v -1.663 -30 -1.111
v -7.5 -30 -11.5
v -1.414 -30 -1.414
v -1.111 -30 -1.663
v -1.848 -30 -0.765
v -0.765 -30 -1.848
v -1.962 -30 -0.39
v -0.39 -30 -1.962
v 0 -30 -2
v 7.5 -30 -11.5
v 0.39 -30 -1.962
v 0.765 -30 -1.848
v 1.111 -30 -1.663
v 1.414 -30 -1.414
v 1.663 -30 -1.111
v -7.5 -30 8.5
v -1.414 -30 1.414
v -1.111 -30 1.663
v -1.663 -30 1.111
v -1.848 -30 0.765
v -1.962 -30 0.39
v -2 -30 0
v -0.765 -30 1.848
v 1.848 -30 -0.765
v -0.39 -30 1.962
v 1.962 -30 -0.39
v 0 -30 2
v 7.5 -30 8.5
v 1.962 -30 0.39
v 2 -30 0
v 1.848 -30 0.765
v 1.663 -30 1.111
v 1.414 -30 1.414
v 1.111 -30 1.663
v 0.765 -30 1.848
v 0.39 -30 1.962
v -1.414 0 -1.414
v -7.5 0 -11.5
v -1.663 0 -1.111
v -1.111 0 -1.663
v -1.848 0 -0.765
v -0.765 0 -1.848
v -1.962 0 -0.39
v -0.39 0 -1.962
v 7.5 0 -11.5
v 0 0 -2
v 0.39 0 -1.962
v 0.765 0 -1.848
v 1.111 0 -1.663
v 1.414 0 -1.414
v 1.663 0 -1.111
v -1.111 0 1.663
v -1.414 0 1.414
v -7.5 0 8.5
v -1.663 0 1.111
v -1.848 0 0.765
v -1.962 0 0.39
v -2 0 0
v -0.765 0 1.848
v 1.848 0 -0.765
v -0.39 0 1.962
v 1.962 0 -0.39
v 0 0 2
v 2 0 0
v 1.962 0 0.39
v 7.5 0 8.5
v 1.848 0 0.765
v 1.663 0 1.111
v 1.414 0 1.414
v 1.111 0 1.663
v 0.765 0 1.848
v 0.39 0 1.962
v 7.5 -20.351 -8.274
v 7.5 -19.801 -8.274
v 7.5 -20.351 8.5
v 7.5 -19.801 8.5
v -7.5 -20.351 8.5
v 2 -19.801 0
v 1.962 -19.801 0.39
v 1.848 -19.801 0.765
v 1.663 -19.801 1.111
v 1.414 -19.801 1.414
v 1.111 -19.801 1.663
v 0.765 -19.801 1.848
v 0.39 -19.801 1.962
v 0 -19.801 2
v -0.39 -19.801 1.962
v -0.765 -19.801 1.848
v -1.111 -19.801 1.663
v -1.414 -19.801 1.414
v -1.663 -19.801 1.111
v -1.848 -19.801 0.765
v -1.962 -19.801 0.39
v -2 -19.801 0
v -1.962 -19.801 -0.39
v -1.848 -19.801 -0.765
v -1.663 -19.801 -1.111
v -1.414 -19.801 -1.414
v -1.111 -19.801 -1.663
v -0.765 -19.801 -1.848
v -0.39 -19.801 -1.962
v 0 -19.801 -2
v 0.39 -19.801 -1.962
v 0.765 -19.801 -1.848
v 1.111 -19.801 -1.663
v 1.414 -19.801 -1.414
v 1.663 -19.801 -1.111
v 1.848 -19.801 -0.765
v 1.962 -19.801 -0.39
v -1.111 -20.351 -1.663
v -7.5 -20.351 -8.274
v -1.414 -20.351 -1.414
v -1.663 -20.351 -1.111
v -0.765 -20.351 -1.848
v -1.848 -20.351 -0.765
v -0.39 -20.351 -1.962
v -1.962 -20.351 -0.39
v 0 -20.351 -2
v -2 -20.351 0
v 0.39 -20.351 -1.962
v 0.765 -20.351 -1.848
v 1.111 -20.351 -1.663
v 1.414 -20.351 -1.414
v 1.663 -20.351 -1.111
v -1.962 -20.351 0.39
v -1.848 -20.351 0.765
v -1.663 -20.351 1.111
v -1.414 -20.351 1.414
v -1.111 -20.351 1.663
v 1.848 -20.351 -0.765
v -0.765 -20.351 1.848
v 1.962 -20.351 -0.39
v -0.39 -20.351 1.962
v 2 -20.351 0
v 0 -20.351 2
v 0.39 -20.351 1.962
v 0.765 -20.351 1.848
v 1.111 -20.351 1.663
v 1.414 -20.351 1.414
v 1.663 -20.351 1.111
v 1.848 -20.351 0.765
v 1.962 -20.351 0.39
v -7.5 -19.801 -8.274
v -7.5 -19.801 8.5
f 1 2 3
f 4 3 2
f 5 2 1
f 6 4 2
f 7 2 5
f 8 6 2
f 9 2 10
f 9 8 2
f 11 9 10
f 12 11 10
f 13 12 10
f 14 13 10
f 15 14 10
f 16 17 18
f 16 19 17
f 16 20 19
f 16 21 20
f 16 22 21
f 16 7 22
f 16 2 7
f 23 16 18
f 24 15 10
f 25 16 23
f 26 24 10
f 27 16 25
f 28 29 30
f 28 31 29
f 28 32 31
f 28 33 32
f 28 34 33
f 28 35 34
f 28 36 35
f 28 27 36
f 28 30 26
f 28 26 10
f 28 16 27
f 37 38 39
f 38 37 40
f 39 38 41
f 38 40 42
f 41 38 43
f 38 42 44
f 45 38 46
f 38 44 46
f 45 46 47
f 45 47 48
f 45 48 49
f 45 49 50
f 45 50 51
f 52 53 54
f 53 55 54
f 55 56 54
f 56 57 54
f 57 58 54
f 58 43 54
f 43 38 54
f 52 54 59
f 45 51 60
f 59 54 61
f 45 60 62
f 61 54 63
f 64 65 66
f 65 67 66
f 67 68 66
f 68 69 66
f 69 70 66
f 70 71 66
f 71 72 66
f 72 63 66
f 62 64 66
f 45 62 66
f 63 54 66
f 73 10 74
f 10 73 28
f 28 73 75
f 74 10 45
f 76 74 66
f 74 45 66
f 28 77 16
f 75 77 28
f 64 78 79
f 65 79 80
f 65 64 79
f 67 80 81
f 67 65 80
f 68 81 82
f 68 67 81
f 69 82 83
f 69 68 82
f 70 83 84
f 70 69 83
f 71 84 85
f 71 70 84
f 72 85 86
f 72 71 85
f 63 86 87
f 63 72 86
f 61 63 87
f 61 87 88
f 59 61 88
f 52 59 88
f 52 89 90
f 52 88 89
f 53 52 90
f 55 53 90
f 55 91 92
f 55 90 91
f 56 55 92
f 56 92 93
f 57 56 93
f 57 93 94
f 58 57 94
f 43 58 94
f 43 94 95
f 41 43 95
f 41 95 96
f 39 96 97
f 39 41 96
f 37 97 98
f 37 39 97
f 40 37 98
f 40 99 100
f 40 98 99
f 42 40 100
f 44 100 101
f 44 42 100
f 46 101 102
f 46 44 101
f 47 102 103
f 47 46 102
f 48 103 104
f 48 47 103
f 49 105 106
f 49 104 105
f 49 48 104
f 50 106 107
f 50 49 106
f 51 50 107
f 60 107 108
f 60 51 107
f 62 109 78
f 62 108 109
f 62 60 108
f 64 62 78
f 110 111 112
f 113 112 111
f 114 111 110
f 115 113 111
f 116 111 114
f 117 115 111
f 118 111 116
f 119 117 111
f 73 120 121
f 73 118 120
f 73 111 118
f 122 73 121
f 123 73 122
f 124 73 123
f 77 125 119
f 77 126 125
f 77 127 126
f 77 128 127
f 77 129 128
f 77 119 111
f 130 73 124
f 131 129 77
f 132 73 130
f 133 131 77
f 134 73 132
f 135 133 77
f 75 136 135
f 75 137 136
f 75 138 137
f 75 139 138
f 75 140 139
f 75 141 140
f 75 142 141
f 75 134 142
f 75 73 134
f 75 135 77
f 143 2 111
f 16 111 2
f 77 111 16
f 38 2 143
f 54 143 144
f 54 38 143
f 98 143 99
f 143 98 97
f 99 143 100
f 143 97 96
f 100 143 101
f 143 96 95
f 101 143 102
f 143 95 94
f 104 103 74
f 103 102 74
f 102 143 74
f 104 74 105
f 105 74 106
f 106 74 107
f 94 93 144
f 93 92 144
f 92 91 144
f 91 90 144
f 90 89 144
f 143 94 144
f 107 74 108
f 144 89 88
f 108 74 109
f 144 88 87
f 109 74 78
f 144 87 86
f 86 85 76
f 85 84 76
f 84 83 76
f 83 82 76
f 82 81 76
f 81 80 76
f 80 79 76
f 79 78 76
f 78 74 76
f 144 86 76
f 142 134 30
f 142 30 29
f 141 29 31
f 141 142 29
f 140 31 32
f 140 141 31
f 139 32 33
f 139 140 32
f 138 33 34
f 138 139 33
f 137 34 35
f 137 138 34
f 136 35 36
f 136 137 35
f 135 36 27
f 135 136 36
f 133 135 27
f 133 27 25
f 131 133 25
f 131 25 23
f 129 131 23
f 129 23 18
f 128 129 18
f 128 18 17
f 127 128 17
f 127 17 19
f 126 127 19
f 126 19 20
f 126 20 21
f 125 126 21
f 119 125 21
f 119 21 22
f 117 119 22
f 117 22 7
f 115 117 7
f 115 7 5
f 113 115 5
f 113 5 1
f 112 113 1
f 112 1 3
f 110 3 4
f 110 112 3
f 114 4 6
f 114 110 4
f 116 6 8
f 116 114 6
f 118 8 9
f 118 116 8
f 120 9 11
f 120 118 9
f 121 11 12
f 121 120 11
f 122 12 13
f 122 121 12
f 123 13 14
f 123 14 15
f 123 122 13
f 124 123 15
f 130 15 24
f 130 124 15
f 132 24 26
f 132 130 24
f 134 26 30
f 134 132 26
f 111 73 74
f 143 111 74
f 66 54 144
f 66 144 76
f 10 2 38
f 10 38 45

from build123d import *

# Parameters (mm, degrees)
F0_W     = 15
F0_H     = 20
F0_R     = 2
F1_DEPTH = 30
F2_W     = 0.55
F2_H     = 16.774644
F3_DEPTH = 15


with BuildPart() as f1:
    # F0 (on Front) → F1 (new body)
    with BuildSketch(Plane.XZ):
        with Locations((0, -1.499573)):
            Rectangle(F0_W, F0_H)
        Circle(F0_R, mode=Mode.SUBTRACT)
    extrude(amount=F1_DEPTH)

    # F2 (on face) → F3 (cut, through all)
    with BuildSketch(Plane.YZ.offset(7.5)):
        with Locations((-20.075855, 0.113105)):
            Rectangle(F2_W, F2_H)
    extrude(amount=-F3_DEPTH, mode=Mode.SUBTRACT)


solid = f1.part
